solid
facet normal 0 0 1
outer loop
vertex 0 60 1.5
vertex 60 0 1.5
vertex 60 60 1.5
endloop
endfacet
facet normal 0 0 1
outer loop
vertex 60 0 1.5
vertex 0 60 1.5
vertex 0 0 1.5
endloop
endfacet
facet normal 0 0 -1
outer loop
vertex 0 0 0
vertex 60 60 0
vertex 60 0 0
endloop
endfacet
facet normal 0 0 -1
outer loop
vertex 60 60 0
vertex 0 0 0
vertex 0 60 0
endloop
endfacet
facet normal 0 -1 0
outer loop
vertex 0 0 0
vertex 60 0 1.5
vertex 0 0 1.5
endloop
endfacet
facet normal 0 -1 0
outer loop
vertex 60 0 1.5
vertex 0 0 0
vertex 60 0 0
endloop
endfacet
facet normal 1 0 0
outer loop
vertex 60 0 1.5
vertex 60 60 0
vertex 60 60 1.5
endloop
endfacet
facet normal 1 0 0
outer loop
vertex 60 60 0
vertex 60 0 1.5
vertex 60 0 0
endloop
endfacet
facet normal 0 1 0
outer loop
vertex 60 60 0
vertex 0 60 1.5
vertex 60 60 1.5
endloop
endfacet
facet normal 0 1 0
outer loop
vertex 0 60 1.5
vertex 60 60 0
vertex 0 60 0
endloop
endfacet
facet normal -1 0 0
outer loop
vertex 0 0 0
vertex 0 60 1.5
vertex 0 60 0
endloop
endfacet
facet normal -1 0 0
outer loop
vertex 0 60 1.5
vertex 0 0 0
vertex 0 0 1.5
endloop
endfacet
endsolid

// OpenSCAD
/**
    Created by Samuel Sticklen (46962487)
*/
thickness = 1.5;
size = 60;
module shape_rectangle() {
    cube([size, size, thickness]);
}

module shape_cylinder() {
    cylinder(thickness, size/2, size/2);
}

module shape_triangle() {
    cylinder(thickness, size/2, size/2, $fn=3);
}

module shape_arrow() {
    rotate([0,0,45]) {
        cube([size/2+10, 10, thickness]);
    }
    rotate([0,0,-45]) {
        cube([size/2, 10, thickness]);
    }
}

module shape_star(points=5) {
    cylinder(thickness, size/4, size/4, $fn=points);
    
    for (i=[0:1:points]) {
        rotate([0,0,i*(360/points)]) {
            translate([size/4,0,0]) {
            cylinder(thickness, size/4, size/4, $fn=3);
            }
        }
    }
}

shape_rectangle();
